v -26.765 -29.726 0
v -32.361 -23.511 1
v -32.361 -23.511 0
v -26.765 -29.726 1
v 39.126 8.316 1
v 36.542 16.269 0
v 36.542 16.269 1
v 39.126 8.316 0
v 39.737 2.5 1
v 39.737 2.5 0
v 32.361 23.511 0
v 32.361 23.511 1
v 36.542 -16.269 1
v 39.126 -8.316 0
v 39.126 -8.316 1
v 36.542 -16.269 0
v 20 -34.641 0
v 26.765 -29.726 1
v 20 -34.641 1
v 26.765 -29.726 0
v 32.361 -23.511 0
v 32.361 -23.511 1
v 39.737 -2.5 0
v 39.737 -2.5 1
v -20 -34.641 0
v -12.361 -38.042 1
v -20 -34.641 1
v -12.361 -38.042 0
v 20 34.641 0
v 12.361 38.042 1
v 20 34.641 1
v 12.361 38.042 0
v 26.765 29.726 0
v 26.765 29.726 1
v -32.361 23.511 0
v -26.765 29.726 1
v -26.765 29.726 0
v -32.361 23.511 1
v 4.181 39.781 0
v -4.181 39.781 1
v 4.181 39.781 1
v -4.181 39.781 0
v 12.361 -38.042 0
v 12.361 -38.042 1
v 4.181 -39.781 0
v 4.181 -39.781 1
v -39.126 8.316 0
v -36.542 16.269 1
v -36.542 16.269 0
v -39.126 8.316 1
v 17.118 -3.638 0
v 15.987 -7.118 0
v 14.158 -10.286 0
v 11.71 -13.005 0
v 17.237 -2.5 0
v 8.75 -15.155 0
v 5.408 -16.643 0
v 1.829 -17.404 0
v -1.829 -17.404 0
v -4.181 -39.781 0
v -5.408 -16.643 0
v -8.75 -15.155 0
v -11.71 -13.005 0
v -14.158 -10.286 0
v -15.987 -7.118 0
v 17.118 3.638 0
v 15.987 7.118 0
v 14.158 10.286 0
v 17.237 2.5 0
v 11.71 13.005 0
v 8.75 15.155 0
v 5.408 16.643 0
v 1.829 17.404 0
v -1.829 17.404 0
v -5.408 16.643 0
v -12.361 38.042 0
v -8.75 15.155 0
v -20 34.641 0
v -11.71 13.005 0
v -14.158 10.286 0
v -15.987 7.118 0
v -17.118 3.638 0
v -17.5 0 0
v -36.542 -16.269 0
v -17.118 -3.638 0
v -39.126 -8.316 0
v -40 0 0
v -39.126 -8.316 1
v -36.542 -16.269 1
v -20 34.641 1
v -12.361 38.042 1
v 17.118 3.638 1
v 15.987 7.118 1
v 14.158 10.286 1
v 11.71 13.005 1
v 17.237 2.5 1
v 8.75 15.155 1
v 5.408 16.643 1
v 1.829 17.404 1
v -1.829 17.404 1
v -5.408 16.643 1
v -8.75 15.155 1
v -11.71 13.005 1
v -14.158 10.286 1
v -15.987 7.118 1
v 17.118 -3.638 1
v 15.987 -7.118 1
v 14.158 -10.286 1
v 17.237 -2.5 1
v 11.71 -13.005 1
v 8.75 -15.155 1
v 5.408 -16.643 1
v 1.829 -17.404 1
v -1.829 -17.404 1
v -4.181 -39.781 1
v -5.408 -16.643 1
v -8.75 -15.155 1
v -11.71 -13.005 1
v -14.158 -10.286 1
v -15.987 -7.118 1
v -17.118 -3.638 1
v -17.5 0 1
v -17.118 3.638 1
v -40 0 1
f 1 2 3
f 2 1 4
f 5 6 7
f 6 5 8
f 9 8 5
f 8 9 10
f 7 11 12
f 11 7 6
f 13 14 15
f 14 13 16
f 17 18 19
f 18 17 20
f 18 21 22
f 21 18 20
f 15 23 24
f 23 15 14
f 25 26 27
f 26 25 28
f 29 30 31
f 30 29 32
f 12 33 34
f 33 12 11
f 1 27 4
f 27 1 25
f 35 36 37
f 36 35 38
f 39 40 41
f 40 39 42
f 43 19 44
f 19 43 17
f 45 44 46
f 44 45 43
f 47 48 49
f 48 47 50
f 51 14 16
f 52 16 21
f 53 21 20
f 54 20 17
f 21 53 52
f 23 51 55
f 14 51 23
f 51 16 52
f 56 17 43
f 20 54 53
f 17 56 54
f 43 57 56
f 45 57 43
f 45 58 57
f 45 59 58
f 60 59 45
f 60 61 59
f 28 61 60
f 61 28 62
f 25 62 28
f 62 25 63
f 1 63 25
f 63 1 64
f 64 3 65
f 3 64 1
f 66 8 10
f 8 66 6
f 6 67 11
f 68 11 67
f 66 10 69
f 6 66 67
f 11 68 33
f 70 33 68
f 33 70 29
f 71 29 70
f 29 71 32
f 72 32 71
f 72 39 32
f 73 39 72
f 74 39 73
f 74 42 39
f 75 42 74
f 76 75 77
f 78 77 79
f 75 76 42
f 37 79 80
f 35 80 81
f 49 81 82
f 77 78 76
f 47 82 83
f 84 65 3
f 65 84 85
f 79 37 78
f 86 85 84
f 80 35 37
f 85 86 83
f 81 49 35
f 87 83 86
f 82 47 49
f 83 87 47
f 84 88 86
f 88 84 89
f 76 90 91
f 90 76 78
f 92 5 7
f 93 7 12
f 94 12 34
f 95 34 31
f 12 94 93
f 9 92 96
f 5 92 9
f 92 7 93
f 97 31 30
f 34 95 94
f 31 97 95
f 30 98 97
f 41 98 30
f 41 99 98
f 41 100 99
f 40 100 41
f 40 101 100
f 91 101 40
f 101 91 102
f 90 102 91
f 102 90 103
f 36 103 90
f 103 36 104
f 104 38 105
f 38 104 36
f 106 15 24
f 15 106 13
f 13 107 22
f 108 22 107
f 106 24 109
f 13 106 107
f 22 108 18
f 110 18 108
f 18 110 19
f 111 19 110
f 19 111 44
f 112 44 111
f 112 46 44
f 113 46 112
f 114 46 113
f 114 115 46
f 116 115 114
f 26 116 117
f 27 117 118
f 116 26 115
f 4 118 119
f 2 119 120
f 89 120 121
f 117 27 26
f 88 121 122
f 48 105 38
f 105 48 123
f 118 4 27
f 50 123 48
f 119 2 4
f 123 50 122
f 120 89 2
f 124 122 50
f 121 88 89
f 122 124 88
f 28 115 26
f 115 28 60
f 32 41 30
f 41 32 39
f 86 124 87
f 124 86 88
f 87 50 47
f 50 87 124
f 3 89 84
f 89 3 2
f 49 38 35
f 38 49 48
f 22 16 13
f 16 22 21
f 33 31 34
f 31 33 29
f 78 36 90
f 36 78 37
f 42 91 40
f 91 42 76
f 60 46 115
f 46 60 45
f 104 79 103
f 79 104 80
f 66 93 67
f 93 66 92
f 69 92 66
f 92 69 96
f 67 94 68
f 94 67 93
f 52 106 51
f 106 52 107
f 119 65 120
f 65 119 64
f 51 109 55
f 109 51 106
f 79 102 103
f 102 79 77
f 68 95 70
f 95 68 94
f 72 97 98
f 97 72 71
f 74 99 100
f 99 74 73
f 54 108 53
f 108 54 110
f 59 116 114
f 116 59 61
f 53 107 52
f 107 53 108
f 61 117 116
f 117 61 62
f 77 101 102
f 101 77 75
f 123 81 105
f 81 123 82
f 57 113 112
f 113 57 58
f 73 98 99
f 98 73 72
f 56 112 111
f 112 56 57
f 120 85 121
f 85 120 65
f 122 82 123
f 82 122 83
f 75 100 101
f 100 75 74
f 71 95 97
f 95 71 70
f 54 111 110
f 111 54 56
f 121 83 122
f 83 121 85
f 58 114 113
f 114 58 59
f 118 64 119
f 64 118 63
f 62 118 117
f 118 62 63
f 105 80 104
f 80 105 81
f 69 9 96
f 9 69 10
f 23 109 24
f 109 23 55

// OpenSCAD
/* Simple Clothing Rack Divider */

// Inner Hole Diameter
inner = 35;

// Outer Hole Diameter
outer = 80;

// Thickness
thick = 1;

// Cutout Size
cutout= 5;

difference() {
cylinder(r=outer/2, h=thick);
#translate([0  , 0  , -thick/2])cylinder(r=inner/2, h=thick*2);
#translate([0  , -cutout/2  , -thick/2])cube([outer, cutout, thick*2]);
}
